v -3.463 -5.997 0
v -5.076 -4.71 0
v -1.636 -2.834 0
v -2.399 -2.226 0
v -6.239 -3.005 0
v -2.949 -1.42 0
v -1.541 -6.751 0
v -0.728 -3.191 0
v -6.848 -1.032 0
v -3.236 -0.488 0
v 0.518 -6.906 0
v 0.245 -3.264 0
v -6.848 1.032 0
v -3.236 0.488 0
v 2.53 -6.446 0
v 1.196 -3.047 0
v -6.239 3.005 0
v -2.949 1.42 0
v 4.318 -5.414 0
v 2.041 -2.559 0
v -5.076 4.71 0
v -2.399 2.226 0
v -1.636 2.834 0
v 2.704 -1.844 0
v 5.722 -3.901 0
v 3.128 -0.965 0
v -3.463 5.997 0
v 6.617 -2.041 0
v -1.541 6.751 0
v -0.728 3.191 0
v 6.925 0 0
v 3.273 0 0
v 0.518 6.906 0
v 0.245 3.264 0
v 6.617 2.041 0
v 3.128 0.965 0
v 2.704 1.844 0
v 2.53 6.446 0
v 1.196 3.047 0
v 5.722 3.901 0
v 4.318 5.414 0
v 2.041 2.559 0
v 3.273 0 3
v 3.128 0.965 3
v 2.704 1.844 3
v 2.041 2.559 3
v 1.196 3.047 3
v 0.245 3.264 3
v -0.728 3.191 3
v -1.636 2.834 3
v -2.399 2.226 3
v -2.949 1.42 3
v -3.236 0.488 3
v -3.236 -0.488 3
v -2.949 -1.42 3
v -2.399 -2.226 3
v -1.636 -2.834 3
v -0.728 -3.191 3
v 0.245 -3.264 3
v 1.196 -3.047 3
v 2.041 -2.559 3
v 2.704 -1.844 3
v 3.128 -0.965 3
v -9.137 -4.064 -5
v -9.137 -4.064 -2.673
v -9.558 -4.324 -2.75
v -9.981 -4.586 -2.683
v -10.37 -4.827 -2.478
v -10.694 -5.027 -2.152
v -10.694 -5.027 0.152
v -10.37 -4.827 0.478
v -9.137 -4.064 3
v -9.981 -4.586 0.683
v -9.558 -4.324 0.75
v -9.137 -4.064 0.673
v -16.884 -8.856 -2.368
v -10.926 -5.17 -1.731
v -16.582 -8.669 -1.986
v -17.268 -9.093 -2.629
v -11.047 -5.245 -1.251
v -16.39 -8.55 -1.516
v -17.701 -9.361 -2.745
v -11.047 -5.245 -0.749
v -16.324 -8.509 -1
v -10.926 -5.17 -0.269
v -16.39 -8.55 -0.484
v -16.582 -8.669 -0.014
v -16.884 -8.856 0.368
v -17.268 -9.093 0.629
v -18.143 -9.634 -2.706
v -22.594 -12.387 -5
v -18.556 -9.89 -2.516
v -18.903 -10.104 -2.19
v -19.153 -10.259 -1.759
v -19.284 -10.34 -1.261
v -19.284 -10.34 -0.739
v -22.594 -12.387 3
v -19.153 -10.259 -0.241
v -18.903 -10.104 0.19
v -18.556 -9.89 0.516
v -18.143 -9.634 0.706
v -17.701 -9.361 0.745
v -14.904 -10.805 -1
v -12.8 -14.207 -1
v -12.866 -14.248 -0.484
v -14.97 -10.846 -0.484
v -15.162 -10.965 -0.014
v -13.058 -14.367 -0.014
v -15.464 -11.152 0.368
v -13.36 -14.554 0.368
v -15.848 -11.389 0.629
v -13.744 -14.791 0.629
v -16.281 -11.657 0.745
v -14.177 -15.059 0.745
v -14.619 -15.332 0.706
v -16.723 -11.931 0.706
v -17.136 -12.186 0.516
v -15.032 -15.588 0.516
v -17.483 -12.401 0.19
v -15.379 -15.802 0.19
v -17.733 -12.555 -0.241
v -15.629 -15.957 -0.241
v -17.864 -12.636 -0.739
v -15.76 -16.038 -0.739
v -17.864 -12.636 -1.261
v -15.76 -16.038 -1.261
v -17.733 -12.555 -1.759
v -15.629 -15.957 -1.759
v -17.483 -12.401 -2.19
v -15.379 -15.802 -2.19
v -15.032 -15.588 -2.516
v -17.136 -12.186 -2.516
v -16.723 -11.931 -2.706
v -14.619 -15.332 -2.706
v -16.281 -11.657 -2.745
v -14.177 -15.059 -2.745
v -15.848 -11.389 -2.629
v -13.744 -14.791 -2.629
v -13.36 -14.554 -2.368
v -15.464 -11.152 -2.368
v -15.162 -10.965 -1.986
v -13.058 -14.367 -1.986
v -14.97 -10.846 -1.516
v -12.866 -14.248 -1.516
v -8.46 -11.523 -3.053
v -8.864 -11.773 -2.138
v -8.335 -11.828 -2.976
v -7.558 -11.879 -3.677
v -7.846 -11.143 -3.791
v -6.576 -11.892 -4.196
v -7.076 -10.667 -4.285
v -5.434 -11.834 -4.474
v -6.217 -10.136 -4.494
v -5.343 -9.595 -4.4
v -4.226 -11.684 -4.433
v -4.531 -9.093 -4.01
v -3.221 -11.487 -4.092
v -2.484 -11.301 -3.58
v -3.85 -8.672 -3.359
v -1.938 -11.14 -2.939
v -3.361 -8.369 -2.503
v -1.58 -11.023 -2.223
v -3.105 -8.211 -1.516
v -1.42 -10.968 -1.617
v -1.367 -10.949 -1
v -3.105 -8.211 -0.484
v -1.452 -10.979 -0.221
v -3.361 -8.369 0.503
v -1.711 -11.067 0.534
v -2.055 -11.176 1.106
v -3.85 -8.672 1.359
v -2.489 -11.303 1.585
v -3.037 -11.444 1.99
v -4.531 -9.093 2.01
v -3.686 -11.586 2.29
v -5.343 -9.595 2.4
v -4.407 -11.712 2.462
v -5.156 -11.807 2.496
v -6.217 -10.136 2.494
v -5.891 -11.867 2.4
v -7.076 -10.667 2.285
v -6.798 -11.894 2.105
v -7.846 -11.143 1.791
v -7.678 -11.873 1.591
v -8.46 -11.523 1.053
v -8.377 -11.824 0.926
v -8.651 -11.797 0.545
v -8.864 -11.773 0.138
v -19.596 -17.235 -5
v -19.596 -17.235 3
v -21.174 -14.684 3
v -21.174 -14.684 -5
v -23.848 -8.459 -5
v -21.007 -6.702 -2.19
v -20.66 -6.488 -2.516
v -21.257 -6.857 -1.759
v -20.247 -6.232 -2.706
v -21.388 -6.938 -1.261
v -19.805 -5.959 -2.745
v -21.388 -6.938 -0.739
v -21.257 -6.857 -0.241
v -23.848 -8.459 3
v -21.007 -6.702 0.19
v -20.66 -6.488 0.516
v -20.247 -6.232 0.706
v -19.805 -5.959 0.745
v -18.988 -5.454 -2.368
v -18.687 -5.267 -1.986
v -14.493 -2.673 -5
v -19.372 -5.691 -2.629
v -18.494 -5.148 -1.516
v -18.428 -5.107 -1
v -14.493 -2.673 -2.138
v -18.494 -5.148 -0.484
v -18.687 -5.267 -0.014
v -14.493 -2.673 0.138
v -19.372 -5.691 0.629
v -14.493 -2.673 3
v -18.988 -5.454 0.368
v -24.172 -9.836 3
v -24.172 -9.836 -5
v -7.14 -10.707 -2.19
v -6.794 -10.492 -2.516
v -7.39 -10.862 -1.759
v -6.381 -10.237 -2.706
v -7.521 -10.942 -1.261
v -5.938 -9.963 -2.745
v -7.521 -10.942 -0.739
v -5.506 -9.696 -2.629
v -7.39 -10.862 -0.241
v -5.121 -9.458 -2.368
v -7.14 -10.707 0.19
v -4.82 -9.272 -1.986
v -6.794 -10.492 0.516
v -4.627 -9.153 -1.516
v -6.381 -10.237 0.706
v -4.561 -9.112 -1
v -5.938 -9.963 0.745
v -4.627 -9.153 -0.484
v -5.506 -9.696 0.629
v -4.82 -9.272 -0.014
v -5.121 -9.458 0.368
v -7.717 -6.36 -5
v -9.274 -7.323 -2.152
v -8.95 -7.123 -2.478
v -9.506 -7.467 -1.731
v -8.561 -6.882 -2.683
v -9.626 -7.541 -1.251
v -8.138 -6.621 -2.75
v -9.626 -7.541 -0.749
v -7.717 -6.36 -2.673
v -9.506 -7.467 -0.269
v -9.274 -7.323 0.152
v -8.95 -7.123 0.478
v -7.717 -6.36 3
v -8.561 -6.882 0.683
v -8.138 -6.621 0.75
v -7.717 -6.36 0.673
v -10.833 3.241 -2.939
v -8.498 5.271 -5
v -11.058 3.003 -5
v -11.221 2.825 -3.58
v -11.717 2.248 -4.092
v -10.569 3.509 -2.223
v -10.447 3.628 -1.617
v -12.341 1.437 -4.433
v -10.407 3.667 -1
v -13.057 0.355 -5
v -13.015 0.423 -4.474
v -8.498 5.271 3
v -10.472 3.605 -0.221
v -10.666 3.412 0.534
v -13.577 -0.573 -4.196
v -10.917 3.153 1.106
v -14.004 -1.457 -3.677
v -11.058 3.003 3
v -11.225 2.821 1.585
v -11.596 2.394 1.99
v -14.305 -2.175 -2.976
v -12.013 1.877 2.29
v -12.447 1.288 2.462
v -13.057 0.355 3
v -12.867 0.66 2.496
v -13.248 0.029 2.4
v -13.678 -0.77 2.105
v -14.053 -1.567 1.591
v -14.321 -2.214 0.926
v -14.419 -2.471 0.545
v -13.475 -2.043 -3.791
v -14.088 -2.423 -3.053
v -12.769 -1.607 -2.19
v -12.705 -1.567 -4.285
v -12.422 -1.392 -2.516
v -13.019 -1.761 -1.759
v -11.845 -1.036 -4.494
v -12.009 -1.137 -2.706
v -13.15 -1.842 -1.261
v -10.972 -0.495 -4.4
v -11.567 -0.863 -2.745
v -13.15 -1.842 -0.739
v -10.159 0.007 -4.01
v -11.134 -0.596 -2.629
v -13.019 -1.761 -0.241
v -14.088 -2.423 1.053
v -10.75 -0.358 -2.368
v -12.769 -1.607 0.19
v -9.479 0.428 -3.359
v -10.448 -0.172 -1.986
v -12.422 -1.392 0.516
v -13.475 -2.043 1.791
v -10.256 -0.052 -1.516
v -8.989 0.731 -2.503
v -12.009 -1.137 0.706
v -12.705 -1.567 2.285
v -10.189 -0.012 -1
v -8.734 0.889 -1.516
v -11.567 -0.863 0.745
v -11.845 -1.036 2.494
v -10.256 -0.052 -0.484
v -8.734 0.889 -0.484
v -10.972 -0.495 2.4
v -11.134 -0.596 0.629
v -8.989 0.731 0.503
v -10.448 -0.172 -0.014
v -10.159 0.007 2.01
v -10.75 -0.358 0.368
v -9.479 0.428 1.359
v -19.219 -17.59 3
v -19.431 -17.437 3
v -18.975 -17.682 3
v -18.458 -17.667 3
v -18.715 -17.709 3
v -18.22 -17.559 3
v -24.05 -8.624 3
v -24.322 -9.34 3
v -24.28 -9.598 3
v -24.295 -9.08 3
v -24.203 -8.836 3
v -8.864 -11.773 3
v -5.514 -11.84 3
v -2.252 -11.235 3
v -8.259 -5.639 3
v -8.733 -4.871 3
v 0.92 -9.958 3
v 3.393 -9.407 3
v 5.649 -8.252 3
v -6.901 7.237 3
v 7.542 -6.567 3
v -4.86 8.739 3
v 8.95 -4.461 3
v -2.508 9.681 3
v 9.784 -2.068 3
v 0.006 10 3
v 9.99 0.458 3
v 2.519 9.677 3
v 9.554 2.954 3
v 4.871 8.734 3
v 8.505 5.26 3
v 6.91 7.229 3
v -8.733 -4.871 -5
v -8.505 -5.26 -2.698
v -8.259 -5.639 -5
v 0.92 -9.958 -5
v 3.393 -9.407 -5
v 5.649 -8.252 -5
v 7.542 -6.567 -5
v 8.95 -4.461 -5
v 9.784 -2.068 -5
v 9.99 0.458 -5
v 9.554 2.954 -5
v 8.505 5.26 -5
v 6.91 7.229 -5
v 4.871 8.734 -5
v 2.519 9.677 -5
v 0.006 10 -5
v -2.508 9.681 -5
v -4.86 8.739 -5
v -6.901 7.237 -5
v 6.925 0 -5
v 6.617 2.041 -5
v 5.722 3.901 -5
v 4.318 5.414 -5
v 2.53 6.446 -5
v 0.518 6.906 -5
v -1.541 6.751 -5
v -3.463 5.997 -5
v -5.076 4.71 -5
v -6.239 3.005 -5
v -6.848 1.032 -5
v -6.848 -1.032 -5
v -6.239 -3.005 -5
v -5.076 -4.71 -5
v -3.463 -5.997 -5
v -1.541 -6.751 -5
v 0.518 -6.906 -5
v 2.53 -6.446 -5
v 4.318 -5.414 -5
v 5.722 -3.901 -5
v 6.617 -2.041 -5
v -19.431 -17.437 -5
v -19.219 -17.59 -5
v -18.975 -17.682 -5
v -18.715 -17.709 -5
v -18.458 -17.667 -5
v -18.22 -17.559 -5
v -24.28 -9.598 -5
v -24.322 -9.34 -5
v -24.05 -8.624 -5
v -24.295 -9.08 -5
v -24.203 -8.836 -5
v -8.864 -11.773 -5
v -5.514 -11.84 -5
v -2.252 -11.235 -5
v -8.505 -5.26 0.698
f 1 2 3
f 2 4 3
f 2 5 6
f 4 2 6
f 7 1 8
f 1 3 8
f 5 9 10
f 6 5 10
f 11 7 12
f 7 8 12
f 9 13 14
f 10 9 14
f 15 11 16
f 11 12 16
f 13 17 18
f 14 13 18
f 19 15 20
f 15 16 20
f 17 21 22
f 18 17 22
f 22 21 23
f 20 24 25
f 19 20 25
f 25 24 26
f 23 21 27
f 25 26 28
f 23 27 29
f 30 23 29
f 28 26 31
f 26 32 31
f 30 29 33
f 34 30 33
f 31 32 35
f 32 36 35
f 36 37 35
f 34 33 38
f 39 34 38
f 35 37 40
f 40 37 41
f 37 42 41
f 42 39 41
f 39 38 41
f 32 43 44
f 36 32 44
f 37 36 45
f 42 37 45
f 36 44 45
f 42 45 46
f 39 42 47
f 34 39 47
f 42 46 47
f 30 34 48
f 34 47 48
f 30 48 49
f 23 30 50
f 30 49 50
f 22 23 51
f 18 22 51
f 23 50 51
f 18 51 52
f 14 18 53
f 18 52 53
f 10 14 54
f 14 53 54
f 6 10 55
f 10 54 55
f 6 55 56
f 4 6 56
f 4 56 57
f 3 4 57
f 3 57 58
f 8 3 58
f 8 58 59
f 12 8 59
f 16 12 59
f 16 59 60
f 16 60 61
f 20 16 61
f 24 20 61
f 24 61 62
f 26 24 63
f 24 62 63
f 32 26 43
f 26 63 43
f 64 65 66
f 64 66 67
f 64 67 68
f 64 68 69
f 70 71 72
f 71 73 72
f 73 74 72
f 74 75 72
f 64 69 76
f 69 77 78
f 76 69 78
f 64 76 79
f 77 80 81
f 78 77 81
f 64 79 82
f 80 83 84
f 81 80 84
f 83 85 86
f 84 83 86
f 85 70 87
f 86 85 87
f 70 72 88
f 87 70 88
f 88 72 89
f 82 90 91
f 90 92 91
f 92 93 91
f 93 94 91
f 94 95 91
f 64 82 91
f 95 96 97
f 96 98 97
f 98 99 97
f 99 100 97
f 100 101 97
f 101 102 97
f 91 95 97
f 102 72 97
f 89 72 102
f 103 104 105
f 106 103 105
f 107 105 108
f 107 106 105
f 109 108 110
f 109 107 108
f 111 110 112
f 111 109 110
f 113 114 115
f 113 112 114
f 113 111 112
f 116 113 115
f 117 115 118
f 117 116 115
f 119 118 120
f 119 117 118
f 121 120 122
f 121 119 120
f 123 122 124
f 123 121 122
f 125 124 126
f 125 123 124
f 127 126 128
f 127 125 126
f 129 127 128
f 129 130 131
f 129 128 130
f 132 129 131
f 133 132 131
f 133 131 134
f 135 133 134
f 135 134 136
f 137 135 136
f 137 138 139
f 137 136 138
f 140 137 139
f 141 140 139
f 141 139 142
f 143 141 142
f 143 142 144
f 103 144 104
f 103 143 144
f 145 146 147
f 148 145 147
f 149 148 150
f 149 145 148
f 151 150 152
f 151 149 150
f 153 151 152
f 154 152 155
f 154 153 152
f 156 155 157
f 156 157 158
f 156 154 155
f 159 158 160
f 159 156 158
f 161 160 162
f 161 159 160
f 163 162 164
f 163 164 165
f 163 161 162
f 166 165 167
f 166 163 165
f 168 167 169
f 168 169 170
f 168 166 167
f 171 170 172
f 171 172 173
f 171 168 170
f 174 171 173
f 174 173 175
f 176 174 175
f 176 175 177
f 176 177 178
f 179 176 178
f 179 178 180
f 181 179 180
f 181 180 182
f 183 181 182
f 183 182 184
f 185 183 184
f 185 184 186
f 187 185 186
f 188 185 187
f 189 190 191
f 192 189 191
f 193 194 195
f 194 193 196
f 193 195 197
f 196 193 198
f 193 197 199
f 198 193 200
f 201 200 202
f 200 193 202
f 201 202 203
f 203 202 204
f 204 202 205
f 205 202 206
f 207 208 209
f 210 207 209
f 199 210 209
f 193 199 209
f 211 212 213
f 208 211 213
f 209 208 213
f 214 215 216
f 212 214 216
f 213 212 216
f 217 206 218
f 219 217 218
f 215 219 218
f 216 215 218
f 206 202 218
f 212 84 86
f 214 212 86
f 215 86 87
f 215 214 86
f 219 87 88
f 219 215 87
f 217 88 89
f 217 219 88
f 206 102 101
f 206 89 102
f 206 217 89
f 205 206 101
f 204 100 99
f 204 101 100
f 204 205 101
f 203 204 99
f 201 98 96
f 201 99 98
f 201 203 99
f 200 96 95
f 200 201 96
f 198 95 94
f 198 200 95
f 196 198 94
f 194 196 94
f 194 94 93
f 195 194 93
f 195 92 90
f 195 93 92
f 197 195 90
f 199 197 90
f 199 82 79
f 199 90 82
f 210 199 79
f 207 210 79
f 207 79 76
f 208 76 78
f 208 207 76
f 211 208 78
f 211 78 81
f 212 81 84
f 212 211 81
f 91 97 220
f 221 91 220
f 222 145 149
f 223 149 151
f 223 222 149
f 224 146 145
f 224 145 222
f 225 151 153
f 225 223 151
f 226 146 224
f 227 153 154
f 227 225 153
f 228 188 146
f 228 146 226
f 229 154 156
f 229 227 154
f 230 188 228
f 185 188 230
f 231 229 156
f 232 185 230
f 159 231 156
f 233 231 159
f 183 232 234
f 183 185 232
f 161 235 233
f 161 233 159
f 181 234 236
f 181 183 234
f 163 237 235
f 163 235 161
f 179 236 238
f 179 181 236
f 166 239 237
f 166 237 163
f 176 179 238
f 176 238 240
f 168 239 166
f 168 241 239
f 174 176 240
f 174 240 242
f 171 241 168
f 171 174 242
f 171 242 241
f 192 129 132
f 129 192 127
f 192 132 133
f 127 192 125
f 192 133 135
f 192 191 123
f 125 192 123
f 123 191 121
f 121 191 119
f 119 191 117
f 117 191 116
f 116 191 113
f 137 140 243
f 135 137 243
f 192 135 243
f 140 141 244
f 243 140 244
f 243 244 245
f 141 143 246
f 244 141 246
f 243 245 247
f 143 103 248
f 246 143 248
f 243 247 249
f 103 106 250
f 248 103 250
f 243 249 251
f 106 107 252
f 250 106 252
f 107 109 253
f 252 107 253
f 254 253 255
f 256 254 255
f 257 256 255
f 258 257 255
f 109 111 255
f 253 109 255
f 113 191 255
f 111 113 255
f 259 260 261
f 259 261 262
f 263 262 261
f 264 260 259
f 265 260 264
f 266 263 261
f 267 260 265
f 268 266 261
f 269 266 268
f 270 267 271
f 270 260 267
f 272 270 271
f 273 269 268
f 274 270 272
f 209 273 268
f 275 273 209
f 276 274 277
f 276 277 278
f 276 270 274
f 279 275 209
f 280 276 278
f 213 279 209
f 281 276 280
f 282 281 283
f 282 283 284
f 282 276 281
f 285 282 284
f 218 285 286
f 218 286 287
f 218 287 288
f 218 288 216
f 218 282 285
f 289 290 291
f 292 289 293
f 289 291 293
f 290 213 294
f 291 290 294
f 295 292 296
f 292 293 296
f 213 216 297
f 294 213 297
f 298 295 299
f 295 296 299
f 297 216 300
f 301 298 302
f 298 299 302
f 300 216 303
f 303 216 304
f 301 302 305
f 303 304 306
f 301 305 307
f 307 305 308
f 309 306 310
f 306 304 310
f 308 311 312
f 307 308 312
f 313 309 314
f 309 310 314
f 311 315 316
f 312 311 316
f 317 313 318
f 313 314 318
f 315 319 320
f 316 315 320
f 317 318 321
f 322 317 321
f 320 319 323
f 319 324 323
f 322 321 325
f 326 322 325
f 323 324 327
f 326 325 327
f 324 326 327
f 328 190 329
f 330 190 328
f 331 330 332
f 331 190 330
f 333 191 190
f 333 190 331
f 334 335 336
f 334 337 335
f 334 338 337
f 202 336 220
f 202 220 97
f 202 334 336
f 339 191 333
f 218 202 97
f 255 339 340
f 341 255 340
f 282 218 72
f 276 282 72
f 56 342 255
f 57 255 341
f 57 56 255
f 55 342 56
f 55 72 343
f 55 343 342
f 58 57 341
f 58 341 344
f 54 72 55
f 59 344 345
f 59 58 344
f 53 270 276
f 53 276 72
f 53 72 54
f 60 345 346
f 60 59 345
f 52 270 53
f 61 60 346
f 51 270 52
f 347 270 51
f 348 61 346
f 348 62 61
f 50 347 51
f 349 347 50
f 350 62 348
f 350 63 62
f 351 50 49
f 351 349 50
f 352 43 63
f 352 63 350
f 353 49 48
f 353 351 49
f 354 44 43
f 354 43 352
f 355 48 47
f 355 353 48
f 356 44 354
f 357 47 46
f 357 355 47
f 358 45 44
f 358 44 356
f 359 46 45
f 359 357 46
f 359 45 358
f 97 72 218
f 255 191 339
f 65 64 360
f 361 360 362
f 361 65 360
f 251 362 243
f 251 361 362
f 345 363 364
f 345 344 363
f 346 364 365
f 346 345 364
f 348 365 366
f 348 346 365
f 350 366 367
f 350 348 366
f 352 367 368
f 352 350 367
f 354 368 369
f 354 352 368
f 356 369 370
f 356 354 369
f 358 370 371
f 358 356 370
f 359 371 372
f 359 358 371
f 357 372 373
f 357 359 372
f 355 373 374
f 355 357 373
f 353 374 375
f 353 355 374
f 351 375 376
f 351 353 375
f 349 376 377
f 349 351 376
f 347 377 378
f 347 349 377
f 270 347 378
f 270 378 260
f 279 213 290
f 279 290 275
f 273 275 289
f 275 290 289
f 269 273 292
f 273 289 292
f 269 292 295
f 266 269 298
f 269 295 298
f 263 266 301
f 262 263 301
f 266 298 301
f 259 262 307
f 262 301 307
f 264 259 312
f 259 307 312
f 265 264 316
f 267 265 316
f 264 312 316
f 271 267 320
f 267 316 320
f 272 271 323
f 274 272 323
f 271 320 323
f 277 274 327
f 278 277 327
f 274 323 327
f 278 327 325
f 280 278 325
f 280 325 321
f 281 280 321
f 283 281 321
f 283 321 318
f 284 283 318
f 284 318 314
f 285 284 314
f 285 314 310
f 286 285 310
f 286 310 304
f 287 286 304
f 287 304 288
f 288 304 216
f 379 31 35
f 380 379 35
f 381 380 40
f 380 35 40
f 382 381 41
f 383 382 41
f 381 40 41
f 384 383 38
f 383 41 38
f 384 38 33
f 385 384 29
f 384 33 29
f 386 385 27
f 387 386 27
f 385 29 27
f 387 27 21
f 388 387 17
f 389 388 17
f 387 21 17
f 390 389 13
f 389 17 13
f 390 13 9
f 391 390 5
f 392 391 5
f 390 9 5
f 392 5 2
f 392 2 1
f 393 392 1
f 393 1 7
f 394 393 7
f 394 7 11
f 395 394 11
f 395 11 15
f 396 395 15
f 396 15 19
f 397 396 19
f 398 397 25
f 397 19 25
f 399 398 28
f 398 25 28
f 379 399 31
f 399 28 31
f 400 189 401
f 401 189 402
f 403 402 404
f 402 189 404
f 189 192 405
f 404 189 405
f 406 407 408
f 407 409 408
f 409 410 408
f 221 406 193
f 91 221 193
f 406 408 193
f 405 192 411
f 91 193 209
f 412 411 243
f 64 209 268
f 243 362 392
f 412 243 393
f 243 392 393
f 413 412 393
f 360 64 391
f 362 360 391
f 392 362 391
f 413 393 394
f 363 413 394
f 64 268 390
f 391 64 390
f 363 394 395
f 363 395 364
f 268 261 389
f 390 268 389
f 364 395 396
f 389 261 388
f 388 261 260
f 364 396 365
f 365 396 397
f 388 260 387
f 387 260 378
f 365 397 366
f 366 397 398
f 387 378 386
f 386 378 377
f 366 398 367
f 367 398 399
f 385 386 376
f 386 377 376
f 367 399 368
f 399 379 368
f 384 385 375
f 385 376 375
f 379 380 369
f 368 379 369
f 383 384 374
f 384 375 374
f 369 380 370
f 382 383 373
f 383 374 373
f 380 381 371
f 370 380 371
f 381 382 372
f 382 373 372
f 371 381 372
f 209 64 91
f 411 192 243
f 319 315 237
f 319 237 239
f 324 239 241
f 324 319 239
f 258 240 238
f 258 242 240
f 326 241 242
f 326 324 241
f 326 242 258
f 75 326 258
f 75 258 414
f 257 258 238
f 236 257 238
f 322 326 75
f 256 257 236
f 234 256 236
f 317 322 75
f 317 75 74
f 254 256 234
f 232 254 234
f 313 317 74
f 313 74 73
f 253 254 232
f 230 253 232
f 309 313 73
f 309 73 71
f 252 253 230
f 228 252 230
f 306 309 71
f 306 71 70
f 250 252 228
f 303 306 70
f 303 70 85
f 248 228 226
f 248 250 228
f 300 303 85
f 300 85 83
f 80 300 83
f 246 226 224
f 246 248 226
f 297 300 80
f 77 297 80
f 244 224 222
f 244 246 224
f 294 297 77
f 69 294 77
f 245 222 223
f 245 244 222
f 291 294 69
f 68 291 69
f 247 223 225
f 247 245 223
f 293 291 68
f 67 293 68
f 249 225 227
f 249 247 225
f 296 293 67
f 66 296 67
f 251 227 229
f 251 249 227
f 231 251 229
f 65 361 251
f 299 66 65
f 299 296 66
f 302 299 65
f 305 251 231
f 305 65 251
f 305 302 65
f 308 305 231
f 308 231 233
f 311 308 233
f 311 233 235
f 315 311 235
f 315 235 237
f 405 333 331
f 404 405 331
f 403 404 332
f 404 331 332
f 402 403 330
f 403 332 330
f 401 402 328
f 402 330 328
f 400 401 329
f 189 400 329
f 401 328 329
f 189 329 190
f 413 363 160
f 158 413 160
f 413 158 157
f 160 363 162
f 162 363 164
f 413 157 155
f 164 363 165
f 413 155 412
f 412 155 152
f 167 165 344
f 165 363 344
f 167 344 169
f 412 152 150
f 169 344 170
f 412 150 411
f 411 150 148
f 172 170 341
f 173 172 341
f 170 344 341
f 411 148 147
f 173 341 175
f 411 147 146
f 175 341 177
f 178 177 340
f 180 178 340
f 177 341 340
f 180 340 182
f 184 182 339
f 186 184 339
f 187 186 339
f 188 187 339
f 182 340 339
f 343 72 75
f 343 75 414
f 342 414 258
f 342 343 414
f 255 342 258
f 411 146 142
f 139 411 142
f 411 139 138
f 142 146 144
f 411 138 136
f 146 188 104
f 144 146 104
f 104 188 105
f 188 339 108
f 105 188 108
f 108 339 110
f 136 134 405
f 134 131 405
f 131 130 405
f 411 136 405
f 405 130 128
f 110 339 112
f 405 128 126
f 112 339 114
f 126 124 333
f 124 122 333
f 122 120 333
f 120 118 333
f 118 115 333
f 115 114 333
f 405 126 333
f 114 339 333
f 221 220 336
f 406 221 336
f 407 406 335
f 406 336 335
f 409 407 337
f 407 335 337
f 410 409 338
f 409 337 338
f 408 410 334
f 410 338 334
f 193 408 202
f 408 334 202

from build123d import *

# Parameters (mm, degrees)
SKETCH1_R               = 10
SKETCH1_R_2             = 6.925
BOSS_EXTRUDE1_DEPTH     = 5
BOSS_EXTRUDE2_START     = 3
SKETCH3_R               = 10
SKETCH3_R_2             = 3.272939667
BOSS_EXTRUDE2_DEPTH     = 3
BOSS_EXTRUDE3_START     = -8
BOSS_EXTRUDE3_DEPTH     = 8
CUT_EXTRUDE1_DEPTH      = 32.194168296
CUT_EXTRUDE1_DEPTH_BACK = 32.194168296
SKETCH5_R               = 1.75
SKETCH6_R               = 3.5
CUT_EXTRUDE2_DEPTH      = 32.194168296


with BuildPart() as part:
    # Sketch1 → Boss-Extrude1 (new body)
    with BuildSketch(Plane.XY):
        Circle(SKETCH1_R)
        Circle(SKETCH1_R_2, mode=Mode.SUBTRACT)
    extrude(amount=-BOSS_EXTRUDE1_DEPTH)

    # Sketch3 → Boss-Extrude2 (add)
    with BuildSketch(Plane.XY.offset(BOSS_EXTRUDE2_START)):
        Circle(SKETCH3_R)
        Circle(SKETCH3_R_2, mode=Mode.SUBTRACT)
    extrude(amount=-BOSS_EXTRUDE2_DEPTH)

    # Sketch4 → Boss-Extrude3 (add)
    with BuildSketch(Plane(origin=(0, 0, -5), x_dir=(-1, 0, 0), z_dir=(0, 0, -1)).offset(BOSS_EXTRUDE3_START)):
        with BuildLine():
            add(Edge.make_bspline(
                [(8.498319818, 5.270537), (12.759977843, 2.15344034), (14.492799423, -2.673176889)],
                knots=[0, 0, 0, 1, 1, 1], degree=2))
            ThreePointArc((8.498319818, 5.270537), (9.617255278, 2.740146147), (10, 0))
            ThreePointArc((10, 0), (9.78187229, -2.077251673), (9.137005098, -4.063882115))
            Line((9.137005098, -4.063882115), (22.594413904, -12.387282242))
            Line((22.594413904, -12.387282242), (24.172466522, -9.835861082))
            ThreePointArc((24.172466522, -9.835861082), (24.295319106, -9.080418377), (23.848010342, -8.459369823))
            Line((23.848010342, -8.459369823), (14.492799423, -2.673176889))
        make_face()
        with BuildLine():
            add(Edge.make_bspline(
                [(-0.920254083, -9.957566591), (3.772003923, -12.378462192), (8.864411751, -11.773245691)],
                knots=[0, 0, 0, 1, 1, 1], degree=2))
            Line((8.864411751, -11.773245691), (18.219622669, -17.559438625))
            ThreePointArc((18.219622669, -17.559438625), (18.975065374, -17.682291209), (19.596113929, -17.234982445))
            Line((19.596113929, -17.234982445), (21.174166547, -14.683561285))
            Line((21.174166547, -14.683561285), (7.716757741, -6.360161159))
            ThreePointArc((7.716757741, -6.360161159), (3.844924831, -9.231281224), (-0.920254083, -9.957566591))
        make_face()
    extrude(amount=BOSS_EXTRUDE3_DEPTH)

    # Sketch5 → Cut-Extrude1 (cut, two sides: drawn at the far end of the back side and taken through both)
    with BuildSketch(Plane(origin=(2.814193836, -4.550034401, 0), x_dir=(0.8504737198659906, 0.526017539457863, 0), z_dir=(0.526017539457863, -0.8504737198659906, 0)).offset(-CUT_EXTRUDE1_DEPTH_BACK)):
        with Locations((-10.421994874, -1)):
            Circle(SKETCH5_R)
        with Locations((-20.108842695, -1)):
            Circle(SKETCH5_R)
    extrude(amount=CUT_EXTRUDE1_DEPTH + CUT_EXTRUDE1_DEPTH_BACK, mode=Mode.SUBTRACT)

    # Sketch6 → Cut-Extrude2 (cut, through all)
    with BuildSketch(Plane(origin=(2.814193836, -4.550034401, 0), x_dir=(0.8504737198659906, 0.526017539457863, 0), z_dir=(0.526017539457863, -0.8504737198659906, 0))):
        with Locations((-10.421994874, -1)):
            Circle(SKETCH6_R)
    cut_extrude2 = extrude(amount=CUT_EXTRUDE2_DEPTH, mode=Mode.SUBTRACT)

    # Mirror1: Cut-Extrude2 across plane
    add(cut_extrude2.mirror(Plane(origin=(0, 0, 0), x_dir=(0, 0, 1), z_dir=(0.526017539457863, -0.8504737198659906, 0))), mode=Mode.SUBTRACT)


solid = part.part
